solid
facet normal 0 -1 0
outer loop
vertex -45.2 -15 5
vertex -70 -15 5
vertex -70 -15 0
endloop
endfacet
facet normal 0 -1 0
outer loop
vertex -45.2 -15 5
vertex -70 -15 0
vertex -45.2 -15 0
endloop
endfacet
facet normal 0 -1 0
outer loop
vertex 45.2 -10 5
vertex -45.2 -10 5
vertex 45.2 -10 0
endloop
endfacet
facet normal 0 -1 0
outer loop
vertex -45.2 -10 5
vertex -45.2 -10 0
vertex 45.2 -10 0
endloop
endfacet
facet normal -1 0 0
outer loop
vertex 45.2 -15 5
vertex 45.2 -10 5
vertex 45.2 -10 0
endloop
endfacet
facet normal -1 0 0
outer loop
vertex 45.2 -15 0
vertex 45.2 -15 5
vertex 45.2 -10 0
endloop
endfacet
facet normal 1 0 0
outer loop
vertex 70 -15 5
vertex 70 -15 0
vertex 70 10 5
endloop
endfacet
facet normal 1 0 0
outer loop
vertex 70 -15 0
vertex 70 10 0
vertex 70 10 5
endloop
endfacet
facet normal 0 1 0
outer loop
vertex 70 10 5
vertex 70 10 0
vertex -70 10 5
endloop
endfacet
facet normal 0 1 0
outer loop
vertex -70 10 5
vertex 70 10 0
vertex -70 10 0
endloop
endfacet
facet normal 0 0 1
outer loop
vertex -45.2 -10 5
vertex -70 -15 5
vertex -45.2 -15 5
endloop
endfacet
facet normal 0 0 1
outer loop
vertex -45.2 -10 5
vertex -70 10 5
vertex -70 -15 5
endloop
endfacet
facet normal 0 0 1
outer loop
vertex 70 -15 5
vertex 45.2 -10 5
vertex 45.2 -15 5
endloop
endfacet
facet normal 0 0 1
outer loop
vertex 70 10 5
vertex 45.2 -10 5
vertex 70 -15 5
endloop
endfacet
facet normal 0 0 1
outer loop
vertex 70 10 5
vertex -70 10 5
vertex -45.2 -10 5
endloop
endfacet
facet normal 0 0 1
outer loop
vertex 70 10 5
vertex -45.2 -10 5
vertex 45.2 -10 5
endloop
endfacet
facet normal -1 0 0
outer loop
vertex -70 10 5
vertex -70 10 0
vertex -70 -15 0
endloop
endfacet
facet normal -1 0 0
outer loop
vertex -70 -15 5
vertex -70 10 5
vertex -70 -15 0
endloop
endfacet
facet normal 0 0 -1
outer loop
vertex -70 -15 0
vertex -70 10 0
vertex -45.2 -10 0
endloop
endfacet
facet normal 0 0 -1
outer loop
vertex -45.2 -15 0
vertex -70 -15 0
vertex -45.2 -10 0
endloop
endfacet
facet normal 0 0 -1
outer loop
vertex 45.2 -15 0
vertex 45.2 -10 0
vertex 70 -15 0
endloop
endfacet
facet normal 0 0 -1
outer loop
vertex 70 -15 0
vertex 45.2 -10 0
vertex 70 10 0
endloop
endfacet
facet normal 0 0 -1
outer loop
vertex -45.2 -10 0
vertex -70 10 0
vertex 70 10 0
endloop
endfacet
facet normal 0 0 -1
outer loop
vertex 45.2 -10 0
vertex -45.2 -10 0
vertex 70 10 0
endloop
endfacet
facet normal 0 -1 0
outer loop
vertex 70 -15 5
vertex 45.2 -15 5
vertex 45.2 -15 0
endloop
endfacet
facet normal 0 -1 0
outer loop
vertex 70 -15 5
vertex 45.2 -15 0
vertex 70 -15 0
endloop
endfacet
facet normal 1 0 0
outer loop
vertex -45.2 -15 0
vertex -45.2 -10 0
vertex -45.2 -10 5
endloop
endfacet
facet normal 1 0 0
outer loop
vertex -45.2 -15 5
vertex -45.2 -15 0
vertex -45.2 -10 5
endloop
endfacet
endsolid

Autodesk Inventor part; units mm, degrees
ref_plane "YZ Plane" through (0, 0, 0) normal (1, 0, 0) x (0, 1, 0)
ref_plane "XZ Plane" through (0, 0, 0) normal (0, 1, 0) x (-1, 0, 0)
ref_plane "XY Plane" through (0, 0, 0) normal (0, 0, 1) x (1, 0, 0)
sketch "Sketch1" plane through (0, 0, 0) normal (0, 0, 1) x (1, 0, 0)
  line L0 (-70, -10) -> (70, -10)
  line L1 (70, -10) -> (70, 10)
  line L2 (70, 10) -> (-70, 10)
  line L3 (-70, 10) -> (-70, -10)
  point P0 (0, 0)
  dimension "width" = 140
  dimension "d1" = 70
  dimension "d2" = 20
  dimension "d3" = 10
extrude "Extrusion1" add sketch "Sketch1" along normal blind 5
sketch "Sketch4" plane through (-70, -10, 0) normal (0, -1, 0) x (1, 0, 0)
  line L0 (0, 0) -> (140, 0) projected
  line L1 (0, 5) -> (140, 5) projected
  line L2 (0, 0) -> (24.8, 0)
  line L3 (24.8, 0) -> (24.8, 5)
  line L4 (24.8, 5) -> (0, 5)
  line L5 (0, 5) -> (0, 0)
  point P0 (70, 0)
  dimension "d28" = 24.8
extrude "Extrusion4" add sketch "Sketch4" along normal blind 5
mirror "Mirror1" about plane through (0, 0, 0) normal (1, 0, 0) of "Extrusion4"
equation "\"d1\" = 0.5 * width"
equation "\"d3\" = 0.5 * d2"
properties part number "EBF_003.1-front-plate_cup-holder"
